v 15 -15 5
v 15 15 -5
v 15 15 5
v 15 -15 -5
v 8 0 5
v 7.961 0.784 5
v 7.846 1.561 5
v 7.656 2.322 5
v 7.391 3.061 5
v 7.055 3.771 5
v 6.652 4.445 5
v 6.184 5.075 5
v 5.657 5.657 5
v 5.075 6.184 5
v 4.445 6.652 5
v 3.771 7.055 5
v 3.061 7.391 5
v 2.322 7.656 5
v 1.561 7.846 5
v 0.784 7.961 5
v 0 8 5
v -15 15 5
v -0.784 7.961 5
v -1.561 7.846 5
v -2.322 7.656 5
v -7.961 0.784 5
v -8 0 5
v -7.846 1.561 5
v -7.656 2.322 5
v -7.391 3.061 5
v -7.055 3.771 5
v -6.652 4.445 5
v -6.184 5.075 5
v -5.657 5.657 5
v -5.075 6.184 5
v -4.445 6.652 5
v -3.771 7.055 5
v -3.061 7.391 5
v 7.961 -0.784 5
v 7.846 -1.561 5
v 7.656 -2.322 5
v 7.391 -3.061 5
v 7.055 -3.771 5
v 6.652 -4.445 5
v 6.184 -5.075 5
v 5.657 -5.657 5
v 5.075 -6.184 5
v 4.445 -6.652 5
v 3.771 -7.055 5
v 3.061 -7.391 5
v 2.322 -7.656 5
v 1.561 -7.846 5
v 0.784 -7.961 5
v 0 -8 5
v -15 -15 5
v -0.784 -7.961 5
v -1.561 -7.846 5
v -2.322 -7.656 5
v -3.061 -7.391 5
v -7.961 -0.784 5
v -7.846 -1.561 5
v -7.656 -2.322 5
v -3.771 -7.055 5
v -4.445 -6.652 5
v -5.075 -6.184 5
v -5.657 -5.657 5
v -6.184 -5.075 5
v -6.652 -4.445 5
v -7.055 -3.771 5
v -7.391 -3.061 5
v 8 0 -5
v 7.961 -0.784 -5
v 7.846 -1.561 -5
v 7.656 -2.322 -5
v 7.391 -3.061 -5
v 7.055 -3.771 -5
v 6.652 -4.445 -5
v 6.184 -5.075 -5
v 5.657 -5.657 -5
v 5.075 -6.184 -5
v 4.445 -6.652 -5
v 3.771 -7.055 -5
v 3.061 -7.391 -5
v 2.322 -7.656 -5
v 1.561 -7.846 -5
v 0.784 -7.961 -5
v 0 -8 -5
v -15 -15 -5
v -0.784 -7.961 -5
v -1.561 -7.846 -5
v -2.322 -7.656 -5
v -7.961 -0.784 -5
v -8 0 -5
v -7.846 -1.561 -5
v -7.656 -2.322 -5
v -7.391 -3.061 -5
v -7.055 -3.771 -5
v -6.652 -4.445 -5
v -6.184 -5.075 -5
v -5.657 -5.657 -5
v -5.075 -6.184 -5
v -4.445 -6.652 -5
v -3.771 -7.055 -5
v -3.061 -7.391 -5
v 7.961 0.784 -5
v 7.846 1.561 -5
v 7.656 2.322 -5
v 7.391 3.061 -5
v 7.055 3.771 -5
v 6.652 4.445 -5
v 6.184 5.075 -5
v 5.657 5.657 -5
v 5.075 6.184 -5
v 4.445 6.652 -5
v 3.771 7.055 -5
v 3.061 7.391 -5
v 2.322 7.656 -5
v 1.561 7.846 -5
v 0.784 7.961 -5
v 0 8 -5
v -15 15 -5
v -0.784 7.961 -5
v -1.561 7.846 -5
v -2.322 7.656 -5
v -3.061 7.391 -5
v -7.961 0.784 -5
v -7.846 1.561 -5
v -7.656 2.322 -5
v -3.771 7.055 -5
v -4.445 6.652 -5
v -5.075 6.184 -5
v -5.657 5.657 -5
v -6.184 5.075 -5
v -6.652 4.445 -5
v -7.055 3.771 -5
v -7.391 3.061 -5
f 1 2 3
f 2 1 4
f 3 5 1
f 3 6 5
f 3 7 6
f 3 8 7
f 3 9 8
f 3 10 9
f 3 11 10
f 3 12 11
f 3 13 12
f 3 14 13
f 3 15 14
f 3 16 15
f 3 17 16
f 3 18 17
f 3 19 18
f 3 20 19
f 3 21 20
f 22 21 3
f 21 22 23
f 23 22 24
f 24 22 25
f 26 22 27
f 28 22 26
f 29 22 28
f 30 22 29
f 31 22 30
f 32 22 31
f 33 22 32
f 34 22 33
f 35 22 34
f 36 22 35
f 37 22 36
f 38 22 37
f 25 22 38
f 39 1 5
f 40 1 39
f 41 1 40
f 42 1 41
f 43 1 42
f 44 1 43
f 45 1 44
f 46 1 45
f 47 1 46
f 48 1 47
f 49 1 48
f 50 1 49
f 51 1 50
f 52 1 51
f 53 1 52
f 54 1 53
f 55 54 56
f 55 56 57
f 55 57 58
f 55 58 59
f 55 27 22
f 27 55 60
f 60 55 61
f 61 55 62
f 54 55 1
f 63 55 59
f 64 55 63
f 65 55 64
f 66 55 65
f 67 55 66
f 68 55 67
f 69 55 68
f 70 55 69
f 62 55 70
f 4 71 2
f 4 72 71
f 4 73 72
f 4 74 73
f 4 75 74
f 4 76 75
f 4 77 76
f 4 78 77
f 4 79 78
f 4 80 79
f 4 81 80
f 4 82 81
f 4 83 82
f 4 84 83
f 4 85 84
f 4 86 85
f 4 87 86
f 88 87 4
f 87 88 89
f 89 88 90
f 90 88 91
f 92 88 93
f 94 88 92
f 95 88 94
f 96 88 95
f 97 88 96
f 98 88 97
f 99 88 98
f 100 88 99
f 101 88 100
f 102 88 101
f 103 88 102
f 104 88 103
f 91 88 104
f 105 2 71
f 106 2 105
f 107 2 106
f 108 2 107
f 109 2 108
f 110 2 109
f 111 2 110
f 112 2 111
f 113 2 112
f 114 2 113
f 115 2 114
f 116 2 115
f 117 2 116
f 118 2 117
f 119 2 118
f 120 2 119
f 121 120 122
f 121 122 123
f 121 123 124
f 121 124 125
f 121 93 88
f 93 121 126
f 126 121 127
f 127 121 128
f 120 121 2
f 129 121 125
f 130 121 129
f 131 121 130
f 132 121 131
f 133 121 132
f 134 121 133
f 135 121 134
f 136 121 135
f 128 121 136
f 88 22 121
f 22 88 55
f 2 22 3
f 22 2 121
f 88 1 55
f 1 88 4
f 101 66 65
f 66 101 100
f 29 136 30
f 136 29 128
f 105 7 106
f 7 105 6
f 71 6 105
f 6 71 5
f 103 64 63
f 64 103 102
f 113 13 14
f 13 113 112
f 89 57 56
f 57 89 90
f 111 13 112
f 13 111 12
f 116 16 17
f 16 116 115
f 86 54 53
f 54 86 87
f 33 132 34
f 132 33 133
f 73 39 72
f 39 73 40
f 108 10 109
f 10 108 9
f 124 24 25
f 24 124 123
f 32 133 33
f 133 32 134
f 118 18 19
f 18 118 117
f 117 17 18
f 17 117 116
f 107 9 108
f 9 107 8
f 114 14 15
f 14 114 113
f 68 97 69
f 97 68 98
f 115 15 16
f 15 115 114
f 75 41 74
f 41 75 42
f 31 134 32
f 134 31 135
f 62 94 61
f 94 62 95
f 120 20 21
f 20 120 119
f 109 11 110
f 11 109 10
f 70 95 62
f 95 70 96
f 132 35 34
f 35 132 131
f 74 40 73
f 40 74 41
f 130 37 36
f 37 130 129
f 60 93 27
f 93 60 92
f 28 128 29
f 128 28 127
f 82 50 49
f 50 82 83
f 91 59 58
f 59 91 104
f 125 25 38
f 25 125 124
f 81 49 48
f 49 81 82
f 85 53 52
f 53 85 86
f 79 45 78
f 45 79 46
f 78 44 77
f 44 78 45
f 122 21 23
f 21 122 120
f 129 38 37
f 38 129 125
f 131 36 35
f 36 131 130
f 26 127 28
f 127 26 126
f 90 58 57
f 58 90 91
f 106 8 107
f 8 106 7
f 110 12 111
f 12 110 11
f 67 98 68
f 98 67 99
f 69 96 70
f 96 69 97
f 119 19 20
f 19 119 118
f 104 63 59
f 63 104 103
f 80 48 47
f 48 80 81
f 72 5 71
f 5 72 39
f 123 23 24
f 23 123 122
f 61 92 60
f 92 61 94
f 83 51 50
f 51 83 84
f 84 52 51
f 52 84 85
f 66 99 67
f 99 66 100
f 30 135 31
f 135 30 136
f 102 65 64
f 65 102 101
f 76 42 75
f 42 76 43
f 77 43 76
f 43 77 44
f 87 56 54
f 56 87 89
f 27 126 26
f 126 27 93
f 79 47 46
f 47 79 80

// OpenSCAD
// test_cube.scad — minimal sanity check for the OpenSCAD -> STL pipeline.
// Render to STL with:  openscad -o test_cube.stl test_cube.scad

$fn = 64; // smoothness of curved surfaces

// A rounded box: a cube with a cylinder hole through it, just to exercise
// a couple of CSG operations so the STL isn't trivially a primitive.
difference() {
    cube([30, 30, 10], center = true);
    cylinder(h = 20, r = 8, center = true);
}
